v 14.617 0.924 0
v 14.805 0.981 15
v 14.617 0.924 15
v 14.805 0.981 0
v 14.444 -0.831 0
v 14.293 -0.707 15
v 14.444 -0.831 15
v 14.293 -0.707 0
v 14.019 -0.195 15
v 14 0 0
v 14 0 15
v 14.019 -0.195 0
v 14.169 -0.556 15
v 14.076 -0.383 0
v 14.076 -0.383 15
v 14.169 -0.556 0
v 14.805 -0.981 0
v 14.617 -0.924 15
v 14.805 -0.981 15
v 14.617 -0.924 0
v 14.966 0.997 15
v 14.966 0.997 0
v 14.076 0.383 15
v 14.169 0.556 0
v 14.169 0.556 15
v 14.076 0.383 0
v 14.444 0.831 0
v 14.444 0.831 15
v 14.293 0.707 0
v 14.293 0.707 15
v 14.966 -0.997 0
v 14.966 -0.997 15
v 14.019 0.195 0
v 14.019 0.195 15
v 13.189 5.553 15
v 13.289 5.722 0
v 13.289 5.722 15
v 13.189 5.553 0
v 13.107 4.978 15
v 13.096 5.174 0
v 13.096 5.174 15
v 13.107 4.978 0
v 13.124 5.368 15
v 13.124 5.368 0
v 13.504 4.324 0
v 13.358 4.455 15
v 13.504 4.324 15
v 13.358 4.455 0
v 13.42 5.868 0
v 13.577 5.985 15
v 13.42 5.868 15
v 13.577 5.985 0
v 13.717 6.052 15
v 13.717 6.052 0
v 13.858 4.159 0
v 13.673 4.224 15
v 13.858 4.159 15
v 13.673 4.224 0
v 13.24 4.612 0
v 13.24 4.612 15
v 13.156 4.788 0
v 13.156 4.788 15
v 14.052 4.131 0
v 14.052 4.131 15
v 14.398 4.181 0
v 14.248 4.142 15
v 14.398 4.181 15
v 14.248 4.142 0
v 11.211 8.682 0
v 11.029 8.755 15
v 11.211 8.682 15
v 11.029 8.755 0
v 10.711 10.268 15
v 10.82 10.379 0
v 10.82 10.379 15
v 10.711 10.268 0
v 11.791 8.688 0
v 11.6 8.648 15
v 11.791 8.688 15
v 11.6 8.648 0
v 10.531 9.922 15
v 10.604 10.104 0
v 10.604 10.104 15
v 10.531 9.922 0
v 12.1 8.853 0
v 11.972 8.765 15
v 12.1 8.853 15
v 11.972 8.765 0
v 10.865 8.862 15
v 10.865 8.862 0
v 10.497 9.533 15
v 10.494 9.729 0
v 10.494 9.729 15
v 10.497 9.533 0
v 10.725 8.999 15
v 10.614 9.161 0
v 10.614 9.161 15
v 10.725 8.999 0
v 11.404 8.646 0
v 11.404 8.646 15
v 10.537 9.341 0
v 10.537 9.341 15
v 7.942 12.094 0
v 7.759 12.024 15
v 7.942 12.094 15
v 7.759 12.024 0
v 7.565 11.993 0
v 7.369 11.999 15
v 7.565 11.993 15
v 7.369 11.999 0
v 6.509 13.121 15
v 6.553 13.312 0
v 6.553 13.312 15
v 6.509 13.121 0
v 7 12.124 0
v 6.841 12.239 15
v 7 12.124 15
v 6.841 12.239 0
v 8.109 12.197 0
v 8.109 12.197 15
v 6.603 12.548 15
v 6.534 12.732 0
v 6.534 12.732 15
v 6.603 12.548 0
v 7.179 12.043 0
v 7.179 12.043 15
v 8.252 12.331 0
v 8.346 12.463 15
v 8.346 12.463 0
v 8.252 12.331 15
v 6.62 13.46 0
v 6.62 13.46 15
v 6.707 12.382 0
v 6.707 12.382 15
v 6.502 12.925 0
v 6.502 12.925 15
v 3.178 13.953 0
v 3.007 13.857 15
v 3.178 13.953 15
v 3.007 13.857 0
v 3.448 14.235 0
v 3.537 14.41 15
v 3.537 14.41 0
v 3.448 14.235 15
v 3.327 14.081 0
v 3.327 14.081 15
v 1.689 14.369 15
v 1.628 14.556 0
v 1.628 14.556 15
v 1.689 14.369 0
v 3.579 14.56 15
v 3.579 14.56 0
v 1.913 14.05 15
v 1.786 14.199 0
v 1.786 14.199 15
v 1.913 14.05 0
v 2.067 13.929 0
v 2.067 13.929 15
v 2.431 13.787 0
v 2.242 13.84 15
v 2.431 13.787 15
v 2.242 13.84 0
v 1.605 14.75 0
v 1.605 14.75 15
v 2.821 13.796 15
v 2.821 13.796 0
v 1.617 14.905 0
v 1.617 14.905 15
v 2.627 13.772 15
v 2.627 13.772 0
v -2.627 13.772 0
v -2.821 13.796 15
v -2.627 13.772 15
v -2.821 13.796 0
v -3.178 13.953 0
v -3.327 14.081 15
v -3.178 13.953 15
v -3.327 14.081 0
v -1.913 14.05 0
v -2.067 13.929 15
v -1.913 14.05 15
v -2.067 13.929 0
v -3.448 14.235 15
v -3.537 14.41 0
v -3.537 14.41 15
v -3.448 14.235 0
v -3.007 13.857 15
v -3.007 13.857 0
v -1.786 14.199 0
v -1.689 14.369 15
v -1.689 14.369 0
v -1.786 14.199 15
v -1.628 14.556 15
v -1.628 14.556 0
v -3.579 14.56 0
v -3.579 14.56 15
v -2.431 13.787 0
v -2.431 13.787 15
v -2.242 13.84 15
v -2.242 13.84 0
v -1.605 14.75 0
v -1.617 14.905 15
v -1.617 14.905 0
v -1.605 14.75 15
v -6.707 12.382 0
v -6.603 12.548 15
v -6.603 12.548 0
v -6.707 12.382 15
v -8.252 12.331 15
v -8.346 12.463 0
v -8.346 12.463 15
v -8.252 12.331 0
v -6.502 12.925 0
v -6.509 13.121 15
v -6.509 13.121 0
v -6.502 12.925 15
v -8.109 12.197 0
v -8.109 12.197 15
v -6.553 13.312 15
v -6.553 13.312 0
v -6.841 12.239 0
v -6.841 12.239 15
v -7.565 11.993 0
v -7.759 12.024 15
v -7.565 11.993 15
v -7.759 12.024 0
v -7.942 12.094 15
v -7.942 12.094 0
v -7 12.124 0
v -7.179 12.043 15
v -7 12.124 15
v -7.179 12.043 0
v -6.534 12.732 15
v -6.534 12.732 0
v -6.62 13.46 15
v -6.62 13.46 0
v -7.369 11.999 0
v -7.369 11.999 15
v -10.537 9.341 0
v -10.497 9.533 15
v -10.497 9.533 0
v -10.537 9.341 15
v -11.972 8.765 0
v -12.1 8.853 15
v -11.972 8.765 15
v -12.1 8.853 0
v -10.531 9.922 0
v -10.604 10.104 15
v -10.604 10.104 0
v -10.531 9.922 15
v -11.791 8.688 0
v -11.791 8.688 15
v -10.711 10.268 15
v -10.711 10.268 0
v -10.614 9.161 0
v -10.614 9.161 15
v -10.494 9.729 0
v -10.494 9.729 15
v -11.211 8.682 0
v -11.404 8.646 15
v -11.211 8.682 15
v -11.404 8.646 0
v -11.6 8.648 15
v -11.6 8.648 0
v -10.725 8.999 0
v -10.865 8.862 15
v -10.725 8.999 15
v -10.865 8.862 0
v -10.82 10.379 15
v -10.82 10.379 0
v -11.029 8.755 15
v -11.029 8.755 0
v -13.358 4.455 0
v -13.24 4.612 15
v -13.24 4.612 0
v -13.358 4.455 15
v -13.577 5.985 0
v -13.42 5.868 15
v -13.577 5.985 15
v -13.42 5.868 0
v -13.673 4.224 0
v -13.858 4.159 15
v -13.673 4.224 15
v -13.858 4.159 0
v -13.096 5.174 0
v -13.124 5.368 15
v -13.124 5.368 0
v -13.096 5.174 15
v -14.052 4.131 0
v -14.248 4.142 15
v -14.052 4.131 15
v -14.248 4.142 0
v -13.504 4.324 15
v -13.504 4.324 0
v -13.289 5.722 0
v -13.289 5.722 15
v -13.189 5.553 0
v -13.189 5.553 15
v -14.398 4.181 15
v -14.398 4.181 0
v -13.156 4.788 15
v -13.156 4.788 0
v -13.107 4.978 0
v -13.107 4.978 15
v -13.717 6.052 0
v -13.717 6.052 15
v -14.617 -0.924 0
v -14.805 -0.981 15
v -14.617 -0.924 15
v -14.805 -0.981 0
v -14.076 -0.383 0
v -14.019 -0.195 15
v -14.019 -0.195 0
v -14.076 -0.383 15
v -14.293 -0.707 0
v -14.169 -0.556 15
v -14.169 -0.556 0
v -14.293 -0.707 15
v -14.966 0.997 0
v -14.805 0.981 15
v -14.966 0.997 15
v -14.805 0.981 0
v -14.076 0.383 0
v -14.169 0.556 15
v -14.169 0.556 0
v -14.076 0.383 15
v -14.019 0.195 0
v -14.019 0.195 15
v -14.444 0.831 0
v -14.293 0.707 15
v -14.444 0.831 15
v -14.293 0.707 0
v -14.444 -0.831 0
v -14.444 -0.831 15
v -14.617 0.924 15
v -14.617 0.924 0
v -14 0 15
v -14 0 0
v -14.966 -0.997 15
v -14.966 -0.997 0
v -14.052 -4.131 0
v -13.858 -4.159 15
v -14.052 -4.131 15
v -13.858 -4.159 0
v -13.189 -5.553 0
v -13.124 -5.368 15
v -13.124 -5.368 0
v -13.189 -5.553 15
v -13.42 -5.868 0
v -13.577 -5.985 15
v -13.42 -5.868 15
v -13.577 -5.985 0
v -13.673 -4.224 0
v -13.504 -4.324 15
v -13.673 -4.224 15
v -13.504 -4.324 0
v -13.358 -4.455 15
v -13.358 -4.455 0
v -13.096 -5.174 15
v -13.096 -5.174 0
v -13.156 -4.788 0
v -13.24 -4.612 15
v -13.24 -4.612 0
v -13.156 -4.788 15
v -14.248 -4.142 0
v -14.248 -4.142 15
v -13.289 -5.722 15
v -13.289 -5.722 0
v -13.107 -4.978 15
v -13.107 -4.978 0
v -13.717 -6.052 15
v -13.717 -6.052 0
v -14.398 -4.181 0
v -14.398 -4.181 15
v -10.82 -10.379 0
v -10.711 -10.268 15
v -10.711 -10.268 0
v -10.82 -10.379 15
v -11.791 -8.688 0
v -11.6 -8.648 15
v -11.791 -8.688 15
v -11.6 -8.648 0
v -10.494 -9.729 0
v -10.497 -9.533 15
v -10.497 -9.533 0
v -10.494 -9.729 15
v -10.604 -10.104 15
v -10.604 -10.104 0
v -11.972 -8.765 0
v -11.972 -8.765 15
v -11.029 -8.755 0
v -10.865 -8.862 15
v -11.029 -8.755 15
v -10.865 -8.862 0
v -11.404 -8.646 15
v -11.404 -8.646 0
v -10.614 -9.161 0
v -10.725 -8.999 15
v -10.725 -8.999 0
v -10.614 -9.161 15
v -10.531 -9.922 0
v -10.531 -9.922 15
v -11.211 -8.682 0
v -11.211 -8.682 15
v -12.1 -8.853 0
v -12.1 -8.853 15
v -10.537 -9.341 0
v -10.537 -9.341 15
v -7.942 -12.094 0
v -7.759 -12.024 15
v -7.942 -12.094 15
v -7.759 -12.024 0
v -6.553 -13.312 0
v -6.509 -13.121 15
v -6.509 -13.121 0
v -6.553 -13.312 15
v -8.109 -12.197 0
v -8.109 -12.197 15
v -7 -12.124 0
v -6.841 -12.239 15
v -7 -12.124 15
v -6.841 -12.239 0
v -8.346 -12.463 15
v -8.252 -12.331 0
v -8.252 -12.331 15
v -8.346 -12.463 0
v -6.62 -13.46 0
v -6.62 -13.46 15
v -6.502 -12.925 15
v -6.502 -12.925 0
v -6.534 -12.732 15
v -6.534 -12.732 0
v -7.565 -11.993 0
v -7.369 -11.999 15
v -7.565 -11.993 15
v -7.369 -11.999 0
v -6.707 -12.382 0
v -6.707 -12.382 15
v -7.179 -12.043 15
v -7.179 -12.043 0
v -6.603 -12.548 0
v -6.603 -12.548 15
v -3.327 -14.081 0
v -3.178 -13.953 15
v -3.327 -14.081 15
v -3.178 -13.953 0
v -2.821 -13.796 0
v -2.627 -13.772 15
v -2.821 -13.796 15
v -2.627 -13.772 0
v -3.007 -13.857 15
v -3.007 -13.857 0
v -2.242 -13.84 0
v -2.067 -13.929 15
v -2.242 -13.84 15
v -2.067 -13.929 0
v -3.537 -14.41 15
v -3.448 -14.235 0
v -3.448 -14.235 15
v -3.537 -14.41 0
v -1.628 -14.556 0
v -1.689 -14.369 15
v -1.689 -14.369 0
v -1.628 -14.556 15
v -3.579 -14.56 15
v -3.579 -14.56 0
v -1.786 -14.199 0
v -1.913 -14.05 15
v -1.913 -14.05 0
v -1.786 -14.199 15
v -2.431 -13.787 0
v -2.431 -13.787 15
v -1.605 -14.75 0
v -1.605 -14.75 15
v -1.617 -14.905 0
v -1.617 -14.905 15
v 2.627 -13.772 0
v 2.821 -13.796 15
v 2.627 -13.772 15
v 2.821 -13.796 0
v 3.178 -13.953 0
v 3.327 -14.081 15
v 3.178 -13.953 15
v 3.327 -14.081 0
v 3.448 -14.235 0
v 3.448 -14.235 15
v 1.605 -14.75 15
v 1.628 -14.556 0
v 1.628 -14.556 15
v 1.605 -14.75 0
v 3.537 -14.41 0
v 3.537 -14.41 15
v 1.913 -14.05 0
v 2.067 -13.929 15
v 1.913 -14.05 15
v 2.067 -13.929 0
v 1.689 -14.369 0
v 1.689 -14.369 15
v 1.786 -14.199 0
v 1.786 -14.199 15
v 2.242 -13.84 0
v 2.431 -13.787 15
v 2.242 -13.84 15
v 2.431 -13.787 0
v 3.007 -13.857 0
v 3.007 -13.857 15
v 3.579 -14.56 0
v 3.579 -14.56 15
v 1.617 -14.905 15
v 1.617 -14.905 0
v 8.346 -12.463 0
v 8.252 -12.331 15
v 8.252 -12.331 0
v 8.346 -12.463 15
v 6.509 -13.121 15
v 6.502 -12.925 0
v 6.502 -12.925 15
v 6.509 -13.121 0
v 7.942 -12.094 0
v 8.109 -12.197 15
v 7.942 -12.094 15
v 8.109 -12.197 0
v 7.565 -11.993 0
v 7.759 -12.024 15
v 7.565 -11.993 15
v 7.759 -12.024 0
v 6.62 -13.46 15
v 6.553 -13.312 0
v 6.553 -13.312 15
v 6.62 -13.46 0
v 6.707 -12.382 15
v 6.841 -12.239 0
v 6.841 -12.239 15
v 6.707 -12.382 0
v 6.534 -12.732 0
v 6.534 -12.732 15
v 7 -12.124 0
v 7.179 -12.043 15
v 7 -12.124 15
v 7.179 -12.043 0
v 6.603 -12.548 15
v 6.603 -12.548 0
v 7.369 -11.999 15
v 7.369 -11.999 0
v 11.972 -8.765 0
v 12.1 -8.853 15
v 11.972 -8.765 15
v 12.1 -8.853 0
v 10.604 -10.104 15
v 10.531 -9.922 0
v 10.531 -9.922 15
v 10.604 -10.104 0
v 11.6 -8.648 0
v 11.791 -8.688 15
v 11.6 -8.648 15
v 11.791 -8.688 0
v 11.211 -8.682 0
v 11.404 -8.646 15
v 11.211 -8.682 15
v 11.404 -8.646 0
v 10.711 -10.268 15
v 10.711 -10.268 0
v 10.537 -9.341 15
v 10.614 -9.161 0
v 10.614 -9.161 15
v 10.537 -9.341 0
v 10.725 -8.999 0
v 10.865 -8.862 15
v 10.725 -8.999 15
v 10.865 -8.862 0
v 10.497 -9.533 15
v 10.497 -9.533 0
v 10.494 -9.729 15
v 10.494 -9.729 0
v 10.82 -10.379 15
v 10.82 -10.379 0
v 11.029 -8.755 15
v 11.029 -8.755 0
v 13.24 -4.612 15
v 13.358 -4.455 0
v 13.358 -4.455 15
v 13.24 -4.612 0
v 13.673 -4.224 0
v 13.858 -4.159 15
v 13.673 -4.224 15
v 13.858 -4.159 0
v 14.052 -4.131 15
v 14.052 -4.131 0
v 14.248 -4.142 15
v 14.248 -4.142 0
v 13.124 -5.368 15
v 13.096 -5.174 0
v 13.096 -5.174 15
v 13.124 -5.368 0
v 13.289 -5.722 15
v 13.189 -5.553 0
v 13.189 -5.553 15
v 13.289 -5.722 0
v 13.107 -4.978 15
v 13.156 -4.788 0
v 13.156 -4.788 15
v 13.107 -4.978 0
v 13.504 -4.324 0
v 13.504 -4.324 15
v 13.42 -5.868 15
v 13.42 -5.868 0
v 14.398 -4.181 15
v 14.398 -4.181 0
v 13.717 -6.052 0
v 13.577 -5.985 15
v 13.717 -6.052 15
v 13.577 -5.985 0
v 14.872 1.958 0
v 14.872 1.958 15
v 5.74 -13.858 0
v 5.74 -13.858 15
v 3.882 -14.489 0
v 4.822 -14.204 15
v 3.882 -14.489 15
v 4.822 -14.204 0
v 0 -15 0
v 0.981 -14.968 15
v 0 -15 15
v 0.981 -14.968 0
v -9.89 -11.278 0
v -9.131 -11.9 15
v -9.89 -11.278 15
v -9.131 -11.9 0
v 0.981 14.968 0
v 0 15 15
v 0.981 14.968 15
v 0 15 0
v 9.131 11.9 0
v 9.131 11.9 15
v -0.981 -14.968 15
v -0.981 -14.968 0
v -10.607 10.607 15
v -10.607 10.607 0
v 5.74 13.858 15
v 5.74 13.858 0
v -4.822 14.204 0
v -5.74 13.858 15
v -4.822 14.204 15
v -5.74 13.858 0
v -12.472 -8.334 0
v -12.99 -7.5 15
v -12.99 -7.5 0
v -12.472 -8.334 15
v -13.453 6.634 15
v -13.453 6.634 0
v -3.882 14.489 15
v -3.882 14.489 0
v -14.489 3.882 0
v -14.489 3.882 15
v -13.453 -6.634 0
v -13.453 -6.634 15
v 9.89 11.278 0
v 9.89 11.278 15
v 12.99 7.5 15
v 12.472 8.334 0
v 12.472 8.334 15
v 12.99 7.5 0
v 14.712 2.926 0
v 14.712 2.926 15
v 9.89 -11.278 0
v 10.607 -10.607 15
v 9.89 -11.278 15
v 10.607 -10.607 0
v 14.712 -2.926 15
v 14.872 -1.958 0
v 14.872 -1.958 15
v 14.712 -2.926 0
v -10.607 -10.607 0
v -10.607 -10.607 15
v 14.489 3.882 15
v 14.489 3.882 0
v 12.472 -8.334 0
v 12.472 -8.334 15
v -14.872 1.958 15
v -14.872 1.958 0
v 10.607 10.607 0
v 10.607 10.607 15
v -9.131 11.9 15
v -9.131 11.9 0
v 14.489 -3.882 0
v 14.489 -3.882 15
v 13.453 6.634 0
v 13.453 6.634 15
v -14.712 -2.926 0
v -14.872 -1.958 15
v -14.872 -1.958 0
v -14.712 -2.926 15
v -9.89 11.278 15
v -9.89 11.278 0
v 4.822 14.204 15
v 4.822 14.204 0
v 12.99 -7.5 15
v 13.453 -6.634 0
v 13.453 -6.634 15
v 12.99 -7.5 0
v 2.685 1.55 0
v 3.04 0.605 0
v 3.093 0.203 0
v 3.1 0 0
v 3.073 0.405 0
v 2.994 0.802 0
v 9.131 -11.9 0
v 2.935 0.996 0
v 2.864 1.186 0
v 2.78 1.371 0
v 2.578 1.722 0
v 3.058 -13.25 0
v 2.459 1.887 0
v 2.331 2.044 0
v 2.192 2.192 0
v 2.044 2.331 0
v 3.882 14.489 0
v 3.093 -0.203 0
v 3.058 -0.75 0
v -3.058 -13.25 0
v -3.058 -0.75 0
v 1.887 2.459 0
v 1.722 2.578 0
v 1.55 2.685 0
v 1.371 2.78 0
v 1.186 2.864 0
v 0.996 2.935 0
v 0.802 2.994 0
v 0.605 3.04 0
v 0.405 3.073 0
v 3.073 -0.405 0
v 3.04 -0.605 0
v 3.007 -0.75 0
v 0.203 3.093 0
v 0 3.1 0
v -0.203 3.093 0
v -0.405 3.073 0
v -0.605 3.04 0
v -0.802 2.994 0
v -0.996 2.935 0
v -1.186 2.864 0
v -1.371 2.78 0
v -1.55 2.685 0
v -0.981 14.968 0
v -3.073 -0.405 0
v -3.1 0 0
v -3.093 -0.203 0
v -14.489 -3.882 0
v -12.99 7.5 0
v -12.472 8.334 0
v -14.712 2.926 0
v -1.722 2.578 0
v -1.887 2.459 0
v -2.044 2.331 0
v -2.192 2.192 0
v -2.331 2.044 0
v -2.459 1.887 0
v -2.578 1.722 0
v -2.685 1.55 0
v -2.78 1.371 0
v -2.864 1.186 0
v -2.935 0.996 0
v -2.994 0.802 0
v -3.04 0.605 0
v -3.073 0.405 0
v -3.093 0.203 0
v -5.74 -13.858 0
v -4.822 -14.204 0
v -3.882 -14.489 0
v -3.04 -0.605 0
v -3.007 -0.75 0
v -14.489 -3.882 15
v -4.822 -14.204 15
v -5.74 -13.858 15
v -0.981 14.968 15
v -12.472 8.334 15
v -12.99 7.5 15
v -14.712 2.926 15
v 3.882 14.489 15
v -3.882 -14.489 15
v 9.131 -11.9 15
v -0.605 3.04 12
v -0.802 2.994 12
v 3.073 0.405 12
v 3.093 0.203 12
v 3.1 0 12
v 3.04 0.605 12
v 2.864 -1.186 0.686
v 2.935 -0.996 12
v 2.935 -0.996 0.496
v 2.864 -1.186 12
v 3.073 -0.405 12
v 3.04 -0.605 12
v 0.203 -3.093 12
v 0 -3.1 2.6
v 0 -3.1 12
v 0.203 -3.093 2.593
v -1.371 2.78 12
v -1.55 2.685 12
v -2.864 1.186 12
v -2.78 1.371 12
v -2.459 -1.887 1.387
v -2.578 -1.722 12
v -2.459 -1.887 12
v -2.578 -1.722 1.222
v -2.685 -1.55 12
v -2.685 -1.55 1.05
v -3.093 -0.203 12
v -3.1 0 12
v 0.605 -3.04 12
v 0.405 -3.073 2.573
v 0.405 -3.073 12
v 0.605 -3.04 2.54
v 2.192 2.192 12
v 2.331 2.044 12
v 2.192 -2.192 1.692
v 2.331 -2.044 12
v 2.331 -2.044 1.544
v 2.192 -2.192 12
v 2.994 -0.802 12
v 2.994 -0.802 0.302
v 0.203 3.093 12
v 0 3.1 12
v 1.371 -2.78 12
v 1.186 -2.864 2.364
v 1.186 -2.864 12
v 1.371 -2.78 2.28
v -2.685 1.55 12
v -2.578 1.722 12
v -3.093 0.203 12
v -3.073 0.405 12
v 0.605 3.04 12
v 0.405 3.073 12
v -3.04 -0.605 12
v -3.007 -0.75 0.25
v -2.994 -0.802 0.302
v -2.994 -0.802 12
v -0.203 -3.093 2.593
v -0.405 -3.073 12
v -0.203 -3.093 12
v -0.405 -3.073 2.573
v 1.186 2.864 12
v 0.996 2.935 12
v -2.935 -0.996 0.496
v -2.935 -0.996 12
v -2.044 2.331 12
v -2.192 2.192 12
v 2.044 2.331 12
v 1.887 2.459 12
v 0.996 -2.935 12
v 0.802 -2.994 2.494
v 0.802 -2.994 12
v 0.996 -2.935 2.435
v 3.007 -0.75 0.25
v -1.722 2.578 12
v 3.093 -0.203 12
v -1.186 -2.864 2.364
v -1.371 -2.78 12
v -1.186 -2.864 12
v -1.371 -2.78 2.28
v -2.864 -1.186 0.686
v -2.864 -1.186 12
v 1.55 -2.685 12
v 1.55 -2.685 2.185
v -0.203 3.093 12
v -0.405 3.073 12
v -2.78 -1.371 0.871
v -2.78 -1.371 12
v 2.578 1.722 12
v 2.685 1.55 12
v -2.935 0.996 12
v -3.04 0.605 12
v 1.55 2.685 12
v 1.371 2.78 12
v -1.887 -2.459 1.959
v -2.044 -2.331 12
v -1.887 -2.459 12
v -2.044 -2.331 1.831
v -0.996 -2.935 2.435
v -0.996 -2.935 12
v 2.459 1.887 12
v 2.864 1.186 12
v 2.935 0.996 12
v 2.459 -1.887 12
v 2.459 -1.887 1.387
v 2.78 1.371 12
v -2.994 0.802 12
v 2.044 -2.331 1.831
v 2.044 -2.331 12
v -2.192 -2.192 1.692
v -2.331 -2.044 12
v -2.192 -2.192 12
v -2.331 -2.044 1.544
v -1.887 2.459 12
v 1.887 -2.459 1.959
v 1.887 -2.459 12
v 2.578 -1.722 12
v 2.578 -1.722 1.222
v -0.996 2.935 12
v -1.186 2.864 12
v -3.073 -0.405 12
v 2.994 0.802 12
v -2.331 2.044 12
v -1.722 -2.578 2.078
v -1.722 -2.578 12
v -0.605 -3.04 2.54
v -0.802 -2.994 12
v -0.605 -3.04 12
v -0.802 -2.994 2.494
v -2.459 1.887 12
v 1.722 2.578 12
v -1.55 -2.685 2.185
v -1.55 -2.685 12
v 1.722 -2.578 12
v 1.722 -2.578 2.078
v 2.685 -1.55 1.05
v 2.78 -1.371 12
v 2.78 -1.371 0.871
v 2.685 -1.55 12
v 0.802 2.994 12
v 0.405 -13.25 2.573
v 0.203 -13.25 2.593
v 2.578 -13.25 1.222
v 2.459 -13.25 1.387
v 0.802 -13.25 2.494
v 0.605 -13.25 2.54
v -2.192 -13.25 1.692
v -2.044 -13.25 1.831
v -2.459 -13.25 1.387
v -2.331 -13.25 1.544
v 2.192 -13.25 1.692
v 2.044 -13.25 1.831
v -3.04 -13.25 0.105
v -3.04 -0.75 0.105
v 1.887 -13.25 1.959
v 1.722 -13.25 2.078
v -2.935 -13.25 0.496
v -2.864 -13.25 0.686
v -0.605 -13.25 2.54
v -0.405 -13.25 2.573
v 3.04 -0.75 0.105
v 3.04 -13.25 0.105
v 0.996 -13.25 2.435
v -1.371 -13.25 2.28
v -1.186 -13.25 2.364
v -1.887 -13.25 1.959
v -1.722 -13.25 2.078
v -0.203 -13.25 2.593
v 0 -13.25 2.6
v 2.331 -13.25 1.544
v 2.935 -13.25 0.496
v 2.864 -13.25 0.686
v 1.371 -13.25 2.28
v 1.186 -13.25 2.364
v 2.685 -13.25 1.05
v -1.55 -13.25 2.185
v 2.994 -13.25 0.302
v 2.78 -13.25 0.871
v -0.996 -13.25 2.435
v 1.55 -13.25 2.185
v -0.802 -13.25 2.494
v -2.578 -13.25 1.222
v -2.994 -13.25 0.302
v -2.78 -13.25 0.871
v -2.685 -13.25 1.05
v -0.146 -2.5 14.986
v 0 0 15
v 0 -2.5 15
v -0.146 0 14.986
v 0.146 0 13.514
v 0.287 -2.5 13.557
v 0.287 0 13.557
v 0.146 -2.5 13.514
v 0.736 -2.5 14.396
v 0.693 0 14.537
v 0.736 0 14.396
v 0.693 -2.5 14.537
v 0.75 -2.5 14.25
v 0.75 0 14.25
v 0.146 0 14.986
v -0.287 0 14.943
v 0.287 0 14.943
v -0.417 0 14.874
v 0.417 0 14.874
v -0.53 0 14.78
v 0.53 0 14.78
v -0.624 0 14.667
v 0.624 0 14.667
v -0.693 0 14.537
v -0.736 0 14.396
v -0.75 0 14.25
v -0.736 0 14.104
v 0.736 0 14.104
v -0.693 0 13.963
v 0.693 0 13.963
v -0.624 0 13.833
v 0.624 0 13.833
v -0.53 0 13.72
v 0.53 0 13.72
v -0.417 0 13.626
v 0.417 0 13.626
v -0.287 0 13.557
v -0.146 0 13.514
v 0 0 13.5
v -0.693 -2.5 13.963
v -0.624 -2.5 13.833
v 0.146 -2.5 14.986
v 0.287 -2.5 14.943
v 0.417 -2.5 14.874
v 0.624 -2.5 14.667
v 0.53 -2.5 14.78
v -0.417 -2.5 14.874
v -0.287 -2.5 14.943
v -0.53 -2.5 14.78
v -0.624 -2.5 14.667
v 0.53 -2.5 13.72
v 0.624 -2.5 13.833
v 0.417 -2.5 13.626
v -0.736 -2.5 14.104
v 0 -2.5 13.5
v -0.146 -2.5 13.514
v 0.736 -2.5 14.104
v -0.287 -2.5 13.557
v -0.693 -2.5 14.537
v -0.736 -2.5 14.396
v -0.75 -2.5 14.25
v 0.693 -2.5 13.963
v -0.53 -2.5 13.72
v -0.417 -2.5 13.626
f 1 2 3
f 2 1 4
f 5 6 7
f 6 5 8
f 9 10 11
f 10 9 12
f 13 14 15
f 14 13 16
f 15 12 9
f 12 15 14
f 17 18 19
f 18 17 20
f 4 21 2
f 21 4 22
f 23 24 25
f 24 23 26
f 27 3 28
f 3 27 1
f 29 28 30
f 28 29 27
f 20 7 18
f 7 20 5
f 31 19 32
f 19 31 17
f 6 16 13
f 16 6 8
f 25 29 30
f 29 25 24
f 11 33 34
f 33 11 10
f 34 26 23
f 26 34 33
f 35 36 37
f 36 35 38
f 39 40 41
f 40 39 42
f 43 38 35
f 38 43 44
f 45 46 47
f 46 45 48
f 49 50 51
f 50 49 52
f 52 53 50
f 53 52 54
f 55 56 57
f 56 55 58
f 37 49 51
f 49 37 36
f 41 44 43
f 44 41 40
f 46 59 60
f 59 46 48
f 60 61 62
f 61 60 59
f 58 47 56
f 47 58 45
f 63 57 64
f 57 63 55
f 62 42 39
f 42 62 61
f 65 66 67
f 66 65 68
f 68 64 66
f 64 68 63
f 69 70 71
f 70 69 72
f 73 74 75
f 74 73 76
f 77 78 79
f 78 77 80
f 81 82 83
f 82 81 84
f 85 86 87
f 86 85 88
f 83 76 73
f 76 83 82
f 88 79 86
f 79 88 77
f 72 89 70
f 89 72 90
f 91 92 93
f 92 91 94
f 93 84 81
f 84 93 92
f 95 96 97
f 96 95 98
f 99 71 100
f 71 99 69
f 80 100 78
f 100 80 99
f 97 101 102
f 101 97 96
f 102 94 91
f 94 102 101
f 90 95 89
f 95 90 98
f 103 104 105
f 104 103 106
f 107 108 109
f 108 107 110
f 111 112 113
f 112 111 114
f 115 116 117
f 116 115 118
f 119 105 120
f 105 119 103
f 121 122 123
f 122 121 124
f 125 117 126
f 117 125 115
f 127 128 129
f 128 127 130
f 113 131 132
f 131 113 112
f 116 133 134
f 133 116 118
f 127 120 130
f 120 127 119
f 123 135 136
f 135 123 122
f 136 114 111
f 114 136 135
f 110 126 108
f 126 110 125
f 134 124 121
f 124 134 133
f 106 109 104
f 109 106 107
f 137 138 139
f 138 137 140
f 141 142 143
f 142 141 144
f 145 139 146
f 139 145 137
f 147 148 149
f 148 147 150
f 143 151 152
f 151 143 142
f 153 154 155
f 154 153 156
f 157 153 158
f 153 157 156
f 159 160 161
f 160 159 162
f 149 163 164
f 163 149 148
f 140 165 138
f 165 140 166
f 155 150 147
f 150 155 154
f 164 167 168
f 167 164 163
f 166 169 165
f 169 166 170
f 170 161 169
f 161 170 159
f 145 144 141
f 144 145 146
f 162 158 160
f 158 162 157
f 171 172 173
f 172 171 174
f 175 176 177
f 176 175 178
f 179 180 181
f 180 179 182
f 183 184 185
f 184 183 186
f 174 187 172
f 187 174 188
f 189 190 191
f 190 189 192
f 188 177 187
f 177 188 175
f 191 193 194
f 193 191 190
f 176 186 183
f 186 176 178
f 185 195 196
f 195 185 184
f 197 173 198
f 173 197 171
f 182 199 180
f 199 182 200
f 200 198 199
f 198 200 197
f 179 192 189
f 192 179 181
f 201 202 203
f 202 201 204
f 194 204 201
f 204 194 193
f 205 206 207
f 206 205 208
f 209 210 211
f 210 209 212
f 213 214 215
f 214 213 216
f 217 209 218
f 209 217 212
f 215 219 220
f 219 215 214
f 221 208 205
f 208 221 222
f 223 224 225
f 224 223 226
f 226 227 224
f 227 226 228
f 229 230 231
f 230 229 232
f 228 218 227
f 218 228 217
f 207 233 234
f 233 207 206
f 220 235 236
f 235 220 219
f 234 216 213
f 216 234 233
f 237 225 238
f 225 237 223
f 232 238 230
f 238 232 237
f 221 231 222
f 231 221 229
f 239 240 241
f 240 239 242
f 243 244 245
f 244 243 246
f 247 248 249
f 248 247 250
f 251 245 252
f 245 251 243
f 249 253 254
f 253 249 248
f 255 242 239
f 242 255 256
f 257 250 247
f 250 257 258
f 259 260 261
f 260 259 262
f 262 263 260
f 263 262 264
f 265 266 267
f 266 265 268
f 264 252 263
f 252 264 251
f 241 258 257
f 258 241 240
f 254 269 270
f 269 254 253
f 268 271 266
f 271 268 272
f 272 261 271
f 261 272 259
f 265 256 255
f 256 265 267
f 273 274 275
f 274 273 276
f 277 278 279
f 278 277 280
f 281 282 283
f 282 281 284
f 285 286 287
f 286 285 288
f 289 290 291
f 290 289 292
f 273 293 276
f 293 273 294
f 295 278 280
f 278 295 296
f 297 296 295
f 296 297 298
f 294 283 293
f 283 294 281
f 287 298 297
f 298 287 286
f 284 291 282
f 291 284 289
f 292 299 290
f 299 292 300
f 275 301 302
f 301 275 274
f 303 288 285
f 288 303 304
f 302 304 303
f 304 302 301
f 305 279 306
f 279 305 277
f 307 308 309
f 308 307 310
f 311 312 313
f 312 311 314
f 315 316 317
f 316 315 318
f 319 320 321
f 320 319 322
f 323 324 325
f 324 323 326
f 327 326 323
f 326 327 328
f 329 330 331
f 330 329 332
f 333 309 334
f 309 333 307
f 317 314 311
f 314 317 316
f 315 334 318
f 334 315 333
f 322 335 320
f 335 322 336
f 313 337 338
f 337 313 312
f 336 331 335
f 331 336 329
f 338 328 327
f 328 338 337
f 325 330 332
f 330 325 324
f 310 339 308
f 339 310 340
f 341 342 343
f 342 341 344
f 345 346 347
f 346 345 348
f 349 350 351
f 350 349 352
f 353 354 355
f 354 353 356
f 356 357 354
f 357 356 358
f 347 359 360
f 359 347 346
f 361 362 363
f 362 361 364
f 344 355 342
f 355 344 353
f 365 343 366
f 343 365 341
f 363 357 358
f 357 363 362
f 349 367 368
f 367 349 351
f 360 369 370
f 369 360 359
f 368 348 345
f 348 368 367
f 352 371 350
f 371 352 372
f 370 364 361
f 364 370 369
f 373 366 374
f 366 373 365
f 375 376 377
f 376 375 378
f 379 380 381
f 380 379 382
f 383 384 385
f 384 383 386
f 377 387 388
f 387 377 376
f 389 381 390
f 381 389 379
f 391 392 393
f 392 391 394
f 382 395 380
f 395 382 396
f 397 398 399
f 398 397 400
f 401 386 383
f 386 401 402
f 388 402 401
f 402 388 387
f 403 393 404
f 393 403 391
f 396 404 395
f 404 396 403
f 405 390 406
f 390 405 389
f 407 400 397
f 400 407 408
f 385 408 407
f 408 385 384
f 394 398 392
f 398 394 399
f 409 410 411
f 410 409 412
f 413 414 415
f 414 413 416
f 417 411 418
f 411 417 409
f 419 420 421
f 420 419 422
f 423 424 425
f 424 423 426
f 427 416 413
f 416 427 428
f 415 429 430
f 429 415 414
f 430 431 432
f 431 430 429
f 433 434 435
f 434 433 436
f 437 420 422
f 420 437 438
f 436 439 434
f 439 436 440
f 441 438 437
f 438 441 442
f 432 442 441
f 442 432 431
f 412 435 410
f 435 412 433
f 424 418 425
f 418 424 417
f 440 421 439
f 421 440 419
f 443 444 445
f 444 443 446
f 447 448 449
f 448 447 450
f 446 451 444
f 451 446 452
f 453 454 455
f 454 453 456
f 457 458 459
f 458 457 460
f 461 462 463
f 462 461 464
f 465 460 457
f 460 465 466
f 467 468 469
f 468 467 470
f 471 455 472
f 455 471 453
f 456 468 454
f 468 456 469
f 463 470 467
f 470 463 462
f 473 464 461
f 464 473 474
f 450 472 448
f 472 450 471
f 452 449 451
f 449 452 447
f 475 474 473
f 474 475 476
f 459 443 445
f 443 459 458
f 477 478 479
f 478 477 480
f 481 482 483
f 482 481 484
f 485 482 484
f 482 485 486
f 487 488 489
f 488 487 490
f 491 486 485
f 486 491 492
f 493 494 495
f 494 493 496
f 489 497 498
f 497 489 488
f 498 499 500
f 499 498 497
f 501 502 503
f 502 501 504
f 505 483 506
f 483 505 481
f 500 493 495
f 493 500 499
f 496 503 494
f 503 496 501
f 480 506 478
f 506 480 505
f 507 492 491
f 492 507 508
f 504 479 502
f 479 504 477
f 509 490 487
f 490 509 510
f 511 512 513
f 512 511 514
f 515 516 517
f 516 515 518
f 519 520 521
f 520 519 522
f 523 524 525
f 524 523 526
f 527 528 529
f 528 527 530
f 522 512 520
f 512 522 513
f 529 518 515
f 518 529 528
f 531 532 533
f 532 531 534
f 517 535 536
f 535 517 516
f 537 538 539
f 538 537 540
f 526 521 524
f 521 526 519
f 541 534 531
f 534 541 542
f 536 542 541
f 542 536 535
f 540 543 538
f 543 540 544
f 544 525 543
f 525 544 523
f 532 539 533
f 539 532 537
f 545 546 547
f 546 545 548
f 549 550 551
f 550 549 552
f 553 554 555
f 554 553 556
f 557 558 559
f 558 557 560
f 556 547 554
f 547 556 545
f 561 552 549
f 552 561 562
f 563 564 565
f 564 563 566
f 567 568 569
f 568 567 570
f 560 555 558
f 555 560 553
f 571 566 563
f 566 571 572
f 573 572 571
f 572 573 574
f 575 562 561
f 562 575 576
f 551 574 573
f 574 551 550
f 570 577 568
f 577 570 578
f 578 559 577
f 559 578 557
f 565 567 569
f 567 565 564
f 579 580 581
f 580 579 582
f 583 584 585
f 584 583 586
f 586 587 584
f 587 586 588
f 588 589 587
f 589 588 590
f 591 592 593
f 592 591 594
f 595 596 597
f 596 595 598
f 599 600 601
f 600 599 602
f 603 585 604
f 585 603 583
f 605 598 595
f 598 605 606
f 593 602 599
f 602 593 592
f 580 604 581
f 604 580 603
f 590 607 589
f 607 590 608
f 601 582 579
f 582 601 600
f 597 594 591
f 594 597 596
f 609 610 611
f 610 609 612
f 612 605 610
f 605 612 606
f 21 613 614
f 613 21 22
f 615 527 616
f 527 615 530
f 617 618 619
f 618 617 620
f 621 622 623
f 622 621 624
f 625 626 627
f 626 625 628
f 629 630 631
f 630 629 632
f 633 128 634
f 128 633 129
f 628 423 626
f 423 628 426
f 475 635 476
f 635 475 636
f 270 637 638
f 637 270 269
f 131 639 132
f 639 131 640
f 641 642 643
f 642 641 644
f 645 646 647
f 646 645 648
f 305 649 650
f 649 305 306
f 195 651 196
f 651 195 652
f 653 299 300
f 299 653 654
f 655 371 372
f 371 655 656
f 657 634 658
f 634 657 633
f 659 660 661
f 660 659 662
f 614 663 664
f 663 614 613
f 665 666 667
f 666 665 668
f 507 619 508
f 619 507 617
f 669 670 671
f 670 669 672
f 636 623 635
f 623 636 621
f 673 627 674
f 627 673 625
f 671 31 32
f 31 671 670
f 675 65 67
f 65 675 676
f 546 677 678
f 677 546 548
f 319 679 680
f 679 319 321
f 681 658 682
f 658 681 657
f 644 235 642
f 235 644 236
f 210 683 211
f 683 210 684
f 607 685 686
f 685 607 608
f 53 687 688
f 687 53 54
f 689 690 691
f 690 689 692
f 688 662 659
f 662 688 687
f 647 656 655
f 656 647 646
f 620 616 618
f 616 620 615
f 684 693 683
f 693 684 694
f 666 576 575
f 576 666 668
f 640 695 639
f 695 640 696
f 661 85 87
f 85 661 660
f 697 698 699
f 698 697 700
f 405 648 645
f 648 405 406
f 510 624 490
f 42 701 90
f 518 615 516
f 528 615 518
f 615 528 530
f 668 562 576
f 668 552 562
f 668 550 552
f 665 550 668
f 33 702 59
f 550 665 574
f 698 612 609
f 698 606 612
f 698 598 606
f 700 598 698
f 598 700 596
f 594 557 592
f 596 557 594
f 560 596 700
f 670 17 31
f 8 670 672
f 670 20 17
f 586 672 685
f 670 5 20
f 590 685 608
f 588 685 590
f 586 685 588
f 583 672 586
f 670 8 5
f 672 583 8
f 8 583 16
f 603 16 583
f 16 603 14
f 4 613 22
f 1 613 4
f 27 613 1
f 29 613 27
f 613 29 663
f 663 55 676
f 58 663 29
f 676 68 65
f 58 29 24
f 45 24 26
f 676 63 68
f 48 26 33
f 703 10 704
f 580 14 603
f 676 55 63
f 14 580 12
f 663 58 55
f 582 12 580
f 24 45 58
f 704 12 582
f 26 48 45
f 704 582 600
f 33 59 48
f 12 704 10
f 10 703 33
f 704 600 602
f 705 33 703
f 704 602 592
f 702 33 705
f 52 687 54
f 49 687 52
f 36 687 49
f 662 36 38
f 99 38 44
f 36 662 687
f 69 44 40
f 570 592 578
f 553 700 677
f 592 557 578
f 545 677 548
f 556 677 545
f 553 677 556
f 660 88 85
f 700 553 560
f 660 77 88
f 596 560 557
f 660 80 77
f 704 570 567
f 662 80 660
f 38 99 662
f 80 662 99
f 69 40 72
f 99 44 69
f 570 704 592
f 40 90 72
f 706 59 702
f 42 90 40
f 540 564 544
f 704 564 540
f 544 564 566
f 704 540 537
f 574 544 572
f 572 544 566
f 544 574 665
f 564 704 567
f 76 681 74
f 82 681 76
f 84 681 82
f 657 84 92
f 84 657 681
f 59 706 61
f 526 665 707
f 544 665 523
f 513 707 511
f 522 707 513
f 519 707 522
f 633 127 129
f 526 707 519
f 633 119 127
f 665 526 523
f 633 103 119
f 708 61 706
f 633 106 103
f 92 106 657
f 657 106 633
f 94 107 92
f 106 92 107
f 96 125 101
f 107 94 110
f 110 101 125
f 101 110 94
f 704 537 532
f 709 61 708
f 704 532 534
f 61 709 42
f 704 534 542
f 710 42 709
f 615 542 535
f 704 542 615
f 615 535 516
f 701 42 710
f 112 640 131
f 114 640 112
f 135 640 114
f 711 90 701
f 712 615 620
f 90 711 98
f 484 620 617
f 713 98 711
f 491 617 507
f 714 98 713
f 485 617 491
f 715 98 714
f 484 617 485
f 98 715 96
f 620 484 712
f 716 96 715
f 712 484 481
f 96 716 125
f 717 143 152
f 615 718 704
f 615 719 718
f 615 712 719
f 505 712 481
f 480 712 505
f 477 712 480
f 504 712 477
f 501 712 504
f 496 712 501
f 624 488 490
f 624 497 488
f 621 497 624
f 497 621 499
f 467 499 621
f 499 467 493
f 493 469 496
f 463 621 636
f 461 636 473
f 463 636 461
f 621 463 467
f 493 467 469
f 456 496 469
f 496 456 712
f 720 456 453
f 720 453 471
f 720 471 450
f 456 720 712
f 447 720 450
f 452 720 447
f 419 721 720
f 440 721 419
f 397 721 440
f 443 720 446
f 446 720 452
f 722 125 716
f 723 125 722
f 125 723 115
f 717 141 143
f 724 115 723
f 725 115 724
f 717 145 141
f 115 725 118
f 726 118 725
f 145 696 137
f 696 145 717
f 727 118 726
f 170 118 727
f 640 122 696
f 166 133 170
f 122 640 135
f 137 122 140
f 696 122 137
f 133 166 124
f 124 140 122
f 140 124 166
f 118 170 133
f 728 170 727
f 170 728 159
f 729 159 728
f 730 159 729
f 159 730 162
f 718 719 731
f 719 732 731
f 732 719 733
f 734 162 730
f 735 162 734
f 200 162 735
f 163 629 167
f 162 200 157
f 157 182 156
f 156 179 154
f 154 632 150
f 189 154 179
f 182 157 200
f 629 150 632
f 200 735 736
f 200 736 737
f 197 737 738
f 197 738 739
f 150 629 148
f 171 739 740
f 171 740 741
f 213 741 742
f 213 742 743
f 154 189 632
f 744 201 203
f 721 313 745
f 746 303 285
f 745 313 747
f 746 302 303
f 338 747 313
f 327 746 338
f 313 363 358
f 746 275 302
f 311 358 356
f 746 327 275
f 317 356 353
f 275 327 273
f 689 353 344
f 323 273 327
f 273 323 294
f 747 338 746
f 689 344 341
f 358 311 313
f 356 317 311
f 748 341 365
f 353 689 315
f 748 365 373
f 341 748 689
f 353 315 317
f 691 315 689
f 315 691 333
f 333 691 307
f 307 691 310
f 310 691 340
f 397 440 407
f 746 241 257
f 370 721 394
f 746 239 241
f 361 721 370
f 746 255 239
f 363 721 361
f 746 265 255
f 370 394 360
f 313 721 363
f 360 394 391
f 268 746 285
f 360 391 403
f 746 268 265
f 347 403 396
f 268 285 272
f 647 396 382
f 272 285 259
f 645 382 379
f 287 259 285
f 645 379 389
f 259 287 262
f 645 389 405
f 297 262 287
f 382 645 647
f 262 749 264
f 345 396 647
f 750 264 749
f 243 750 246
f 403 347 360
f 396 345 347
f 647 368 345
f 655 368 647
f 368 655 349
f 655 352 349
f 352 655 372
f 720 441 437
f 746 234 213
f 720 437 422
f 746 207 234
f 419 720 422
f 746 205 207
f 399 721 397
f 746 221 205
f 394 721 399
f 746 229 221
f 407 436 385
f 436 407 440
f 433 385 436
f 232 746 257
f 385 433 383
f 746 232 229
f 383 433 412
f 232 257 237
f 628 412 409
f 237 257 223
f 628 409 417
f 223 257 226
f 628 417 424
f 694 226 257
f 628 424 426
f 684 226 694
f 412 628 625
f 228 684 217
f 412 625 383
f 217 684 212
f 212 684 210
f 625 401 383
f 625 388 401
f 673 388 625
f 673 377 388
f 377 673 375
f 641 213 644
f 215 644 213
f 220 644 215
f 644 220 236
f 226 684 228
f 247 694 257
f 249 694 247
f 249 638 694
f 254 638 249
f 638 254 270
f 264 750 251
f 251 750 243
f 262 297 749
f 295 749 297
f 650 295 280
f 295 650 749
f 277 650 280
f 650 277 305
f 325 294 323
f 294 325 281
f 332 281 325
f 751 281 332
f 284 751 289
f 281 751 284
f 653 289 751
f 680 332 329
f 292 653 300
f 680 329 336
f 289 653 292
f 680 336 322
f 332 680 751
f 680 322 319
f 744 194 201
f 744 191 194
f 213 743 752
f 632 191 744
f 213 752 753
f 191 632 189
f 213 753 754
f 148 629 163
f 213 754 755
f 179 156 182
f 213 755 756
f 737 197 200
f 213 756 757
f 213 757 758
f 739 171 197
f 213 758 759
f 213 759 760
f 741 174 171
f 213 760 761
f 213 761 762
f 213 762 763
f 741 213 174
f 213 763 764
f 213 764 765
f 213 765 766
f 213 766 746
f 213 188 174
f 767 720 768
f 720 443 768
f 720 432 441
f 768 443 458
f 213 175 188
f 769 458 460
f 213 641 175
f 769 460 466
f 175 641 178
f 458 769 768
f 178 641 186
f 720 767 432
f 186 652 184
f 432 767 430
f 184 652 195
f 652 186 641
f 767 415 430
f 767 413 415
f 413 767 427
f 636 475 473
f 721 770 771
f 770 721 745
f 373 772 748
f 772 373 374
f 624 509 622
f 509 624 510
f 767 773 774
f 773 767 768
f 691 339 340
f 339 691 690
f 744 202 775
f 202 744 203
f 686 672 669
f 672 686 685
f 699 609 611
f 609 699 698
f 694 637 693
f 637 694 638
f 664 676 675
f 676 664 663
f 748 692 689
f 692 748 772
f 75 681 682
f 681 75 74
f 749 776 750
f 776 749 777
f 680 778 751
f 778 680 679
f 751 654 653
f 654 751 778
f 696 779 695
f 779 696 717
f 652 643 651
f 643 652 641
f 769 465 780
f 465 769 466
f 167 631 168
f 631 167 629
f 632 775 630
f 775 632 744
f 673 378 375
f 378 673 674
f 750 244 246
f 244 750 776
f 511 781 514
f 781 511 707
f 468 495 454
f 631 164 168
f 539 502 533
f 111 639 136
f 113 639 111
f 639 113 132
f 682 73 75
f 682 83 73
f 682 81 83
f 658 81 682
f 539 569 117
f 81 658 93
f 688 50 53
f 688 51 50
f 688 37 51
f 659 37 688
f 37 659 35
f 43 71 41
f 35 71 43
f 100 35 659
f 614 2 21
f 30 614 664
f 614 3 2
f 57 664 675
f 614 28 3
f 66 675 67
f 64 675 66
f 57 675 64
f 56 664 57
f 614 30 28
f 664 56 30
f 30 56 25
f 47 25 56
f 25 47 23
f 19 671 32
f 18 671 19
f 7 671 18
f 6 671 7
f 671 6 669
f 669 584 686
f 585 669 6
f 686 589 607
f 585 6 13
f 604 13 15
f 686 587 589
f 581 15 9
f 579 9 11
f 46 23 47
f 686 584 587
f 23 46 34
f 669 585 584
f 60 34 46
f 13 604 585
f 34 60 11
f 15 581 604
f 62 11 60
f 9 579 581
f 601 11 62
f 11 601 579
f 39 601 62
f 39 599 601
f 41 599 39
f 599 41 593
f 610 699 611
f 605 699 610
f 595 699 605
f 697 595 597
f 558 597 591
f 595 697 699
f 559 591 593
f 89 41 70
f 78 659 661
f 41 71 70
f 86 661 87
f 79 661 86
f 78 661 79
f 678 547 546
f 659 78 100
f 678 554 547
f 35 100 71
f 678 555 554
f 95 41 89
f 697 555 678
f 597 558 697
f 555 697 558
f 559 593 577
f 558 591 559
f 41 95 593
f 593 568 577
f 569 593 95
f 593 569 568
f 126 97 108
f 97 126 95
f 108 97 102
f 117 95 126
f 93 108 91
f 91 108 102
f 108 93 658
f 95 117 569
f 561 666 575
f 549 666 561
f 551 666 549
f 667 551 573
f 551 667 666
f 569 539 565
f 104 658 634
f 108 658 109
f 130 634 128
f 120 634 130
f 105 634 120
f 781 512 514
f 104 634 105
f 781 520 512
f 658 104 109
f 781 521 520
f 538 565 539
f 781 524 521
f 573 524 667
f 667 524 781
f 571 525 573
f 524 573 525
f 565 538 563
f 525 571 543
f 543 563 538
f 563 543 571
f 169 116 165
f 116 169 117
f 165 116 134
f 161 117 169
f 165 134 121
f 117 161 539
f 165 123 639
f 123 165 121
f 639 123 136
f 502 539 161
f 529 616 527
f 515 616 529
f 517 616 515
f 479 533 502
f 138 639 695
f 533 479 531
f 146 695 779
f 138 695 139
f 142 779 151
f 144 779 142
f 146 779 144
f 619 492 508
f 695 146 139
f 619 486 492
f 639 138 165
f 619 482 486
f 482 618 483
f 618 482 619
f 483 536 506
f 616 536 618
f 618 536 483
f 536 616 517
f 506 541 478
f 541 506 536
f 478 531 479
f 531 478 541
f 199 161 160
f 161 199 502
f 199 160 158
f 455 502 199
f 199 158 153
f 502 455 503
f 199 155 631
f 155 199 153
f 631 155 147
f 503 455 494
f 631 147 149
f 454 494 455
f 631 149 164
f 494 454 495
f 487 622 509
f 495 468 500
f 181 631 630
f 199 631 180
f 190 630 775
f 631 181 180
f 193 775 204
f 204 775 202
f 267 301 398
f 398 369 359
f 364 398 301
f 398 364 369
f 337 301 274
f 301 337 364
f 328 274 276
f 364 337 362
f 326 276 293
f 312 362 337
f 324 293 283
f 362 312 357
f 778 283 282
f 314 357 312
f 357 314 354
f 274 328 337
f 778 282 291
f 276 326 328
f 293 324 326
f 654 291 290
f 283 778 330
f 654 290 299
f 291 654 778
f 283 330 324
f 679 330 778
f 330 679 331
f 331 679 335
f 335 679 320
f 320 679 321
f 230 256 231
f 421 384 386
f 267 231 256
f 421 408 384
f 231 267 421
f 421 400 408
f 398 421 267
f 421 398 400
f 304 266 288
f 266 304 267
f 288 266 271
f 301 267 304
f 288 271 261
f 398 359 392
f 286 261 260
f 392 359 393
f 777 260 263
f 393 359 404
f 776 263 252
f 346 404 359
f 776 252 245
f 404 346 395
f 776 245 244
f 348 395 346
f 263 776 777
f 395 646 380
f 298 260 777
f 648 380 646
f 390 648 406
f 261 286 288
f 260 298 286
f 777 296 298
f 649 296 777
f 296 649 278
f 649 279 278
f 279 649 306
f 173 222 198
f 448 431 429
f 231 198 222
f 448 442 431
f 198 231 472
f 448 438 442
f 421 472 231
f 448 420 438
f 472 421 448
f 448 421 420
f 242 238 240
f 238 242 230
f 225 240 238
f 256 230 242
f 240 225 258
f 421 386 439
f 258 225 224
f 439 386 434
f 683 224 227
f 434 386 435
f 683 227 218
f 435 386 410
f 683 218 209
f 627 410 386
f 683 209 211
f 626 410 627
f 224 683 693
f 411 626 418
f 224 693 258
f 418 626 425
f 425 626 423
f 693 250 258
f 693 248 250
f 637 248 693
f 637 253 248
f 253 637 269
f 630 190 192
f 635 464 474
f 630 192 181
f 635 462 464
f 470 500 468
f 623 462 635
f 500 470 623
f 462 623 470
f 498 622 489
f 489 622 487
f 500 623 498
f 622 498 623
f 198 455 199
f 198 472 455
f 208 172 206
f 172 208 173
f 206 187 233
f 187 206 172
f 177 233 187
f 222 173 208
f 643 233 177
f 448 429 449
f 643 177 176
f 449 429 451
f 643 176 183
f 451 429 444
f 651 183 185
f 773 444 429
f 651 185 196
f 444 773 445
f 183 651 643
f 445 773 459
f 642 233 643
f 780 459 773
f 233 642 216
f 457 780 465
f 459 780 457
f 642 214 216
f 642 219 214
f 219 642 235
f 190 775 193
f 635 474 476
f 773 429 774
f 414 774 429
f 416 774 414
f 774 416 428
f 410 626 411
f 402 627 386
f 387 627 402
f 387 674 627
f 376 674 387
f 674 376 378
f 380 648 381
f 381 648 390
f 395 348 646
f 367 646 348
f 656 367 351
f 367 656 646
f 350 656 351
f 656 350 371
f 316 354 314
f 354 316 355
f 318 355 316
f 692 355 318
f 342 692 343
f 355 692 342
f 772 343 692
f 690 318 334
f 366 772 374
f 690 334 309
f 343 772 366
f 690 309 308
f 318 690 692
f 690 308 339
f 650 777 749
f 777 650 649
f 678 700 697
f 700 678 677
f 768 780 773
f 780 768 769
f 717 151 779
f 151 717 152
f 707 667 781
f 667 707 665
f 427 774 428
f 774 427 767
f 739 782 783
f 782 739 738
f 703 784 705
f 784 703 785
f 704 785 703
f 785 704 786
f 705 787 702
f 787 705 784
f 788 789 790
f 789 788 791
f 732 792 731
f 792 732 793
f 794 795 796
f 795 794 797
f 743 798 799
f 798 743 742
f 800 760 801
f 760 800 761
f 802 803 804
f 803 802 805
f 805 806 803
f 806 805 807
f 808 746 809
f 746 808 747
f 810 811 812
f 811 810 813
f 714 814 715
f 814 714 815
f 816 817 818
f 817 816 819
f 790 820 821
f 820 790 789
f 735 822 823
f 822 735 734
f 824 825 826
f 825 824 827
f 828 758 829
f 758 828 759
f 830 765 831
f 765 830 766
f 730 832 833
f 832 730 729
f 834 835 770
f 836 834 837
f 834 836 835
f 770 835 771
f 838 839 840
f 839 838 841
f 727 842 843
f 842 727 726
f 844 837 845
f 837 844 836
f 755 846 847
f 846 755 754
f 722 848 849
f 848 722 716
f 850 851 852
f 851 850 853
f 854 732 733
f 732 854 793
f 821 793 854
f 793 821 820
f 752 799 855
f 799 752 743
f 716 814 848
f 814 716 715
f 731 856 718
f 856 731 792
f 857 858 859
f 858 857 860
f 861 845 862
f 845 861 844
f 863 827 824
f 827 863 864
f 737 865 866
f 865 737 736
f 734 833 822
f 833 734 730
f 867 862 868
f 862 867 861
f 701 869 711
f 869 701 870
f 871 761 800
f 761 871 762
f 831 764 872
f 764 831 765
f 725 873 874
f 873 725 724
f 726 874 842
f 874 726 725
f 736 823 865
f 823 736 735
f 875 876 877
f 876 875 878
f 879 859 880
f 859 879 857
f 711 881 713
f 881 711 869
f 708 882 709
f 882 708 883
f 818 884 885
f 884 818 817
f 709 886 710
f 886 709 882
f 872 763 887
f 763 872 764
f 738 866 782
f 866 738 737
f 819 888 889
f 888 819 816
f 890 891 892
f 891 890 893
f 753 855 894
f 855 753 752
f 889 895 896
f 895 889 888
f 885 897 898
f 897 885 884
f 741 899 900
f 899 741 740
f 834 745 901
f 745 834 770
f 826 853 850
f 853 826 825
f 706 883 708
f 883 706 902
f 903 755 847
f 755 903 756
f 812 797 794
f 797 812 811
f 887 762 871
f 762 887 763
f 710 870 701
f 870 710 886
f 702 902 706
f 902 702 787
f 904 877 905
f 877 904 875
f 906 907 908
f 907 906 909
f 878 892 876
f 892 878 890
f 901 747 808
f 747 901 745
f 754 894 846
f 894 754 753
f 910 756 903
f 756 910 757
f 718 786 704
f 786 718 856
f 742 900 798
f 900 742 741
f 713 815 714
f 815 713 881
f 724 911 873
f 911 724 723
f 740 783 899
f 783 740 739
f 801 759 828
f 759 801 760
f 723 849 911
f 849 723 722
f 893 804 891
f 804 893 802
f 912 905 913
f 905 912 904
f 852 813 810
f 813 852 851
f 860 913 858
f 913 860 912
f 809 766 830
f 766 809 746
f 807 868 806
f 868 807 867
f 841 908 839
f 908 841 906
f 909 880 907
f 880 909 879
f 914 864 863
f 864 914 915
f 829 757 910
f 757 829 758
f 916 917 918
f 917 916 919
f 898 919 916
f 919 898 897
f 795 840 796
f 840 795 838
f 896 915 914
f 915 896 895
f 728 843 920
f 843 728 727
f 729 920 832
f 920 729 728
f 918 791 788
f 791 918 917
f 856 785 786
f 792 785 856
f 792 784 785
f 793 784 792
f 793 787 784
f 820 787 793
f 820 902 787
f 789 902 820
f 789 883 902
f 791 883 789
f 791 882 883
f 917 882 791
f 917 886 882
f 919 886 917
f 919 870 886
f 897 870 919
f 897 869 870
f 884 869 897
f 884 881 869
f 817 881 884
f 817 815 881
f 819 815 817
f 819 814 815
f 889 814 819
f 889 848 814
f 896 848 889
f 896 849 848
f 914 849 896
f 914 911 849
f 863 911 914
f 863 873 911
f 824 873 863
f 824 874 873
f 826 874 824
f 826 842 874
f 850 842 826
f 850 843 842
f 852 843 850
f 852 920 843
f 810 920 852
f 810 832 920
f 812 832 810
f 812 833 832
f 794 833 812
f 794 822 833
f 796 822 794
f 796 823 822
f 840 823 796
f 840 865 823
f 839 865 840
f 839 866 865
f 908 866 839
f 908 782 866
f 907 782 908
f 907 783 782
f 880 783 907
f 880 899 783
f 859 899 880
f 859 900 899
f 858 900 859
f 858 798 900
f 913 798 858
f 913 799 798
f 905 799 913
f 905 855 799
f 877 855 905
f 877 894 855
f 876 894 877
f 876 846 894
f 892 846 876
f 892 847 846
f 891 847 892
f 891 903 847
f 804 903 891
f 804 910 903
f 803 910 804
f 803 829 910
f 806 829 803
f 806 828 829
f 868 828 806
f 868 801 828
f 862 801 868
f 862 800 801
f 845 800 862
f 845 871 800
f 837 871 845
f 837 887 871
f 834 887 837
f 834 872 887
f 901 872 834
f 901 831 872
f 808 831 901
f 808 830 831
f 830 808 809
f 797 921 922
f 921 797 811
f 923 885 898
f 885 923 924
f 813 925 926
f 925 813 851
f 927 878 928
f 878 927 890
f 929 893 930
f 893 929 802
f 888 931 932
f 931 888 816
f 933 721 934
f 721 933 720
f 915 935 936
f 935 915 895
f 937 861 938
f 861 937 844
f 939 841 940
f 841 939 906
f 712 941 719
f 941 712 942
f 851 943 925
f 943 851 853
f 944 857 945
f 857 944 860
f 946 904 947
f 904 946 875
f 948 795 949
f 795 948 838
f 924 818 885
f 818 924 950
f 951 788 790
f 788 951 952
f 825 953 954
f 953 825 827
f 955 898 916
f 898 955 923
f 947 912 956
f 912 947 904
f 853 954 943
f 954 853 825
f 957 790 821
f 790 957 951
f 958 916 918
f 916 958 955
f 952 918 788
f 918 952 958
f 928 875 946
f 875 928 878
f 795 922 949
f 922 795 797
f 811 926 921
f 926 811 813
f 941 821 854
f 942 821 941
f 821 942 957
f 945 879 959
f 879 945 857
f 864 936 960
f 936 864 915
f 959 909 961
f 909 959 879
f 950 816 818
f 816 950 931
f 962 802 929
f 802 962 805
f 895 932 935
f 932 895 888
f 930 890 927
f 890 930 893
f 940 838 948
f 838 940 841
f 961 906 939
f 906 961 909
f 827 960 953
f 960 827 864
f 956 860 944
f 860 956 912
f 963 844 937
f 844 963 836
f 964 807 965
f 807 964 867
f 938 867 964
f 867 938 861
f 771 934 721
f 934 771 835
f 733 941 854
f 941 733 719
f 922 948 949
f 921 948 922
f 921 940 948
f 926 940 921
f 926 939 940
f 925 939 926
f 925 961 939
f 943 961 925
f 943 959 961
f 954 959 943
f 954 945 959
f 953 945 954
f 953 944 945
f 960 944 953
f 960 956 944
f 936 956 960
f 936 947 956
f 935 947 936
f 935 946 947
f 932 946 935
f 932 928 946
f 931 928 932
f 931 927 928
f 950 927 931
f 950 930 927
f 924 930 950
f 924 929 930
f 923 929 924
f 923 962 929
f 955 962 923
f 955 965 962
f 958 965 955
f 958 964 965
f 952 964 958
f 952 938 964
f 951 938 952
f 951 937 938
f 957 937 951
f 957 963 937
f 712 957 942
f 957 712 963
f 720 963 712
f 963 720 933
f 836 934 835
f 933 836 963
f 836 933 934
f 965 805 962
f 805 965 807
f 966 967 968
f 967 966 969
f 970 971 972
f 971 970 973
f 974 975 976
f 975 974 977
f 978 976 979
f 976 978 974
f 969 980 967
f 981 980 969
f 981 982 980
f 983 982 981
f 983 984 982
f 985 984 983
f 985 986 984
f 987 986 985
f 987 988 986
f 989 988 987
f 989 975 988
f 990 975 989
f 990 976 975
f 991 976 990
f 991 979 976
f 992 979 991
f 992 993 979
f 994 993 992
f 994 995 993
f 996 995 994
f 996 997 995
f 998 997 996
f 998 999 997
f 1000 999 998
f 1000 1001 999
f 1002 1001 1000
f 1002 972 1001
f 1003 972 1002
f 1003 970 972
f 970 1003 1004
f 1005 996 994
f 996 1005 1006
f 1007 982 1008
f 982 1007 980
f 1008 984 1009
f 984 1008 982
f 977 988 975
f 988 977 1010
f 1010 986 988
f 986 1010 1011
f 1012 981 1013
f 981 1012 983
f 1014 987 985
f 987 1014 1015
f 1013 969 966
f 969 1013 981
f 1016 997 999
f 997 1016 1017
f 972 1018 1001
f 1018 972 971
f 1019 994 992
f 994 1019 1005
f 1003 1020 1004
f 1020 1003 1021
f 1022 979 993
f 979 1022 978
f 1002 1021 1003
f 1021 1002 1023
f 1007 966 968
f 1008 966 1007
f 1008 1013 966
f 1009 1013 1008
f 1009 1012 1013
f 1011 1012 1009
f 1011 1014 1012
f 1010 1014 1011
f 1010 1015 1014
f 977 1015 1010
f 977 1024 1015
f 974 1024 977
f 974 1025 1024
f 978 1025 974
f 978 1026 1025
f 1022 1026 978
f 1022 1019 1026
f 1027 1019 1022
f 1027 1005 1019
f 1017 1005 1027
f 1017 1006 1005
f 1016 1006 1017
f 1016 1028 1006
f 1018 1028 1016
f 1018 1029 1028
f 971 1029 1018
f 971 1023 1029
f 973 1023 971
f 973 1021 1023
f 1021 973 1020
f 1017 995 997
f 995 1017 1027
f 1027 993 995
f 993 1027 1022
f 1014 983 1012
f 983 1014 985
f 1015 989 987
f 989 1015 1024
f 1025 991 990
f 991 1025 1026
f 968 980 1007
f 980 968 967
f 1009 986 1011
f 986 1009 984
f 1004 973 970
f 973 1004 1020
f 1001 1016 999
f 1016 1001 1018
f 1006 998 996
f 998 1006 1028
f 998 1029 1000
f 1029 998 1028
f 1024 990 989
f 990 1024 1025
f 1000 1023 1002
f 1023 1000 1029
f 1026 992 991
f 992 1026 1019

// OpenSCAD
// Hotplate stirrer knob - D-shaft 6 mm
// Print orientation: bottom face (with D-bore opening) on the bed, z = 0

$fn = 96;

// ---- Dimensions (mm) ----
knob_d        = 30;    // knob outer diameter
knob_h        = 15;    // knob height
shaft_d       = 6;     // D-shaft diameter
bore_d        = 6.2;   // D-blind bore diameter
bore_depth    = 12;    // bore depth from bottom face
bore_flat     = (bore_d - 4.7) / 2;  // offset of circle centre from flat side
groove_d      = 2;     // grip groove (half-cylinder) diameter
groove_count  = 18;    // number of evenly spaced grooves
pointer_w     = 1.5;   // pointer groove width
pointer_d     = pointer_w / 2;         // pointer groove depth (half-cylinder)
eps           = 0.5;   // overcut for clean boolean differences

// ---- Model ----
difference() {
    // Main knob body
    cylinder(d = knob_d, h = knob_h);

    // D-shaped blind bore in bottom face
    translate([0, 0, -eps])
        cylinder(d = bore_d, h = bore_depth + eps);
    translate([0, -bore_flat, -eps])
        rotate([90, 0, 0])
            cylinder(d = bore_d, h = bore_depth + eps);

    // Vertical grip grooves along full height
    for (i = [0 : groove_count - 1])
        rotate([0, 0, i * 360 / groove_count])
            translate([knob_d / 2, 0, -eps])
                cylinder(r = groove_d / 2, h = knob_h + 2 * eps, $fn = 32);

    // Pointer groove on top face, centred on +x axis
    translate([0, 0, knob_h - pointer_d])
        rotate([90, 0, 0])
            cylinder(r = pointer_d, h = pointer_w + 2 * eps, $fn = 32);
}
